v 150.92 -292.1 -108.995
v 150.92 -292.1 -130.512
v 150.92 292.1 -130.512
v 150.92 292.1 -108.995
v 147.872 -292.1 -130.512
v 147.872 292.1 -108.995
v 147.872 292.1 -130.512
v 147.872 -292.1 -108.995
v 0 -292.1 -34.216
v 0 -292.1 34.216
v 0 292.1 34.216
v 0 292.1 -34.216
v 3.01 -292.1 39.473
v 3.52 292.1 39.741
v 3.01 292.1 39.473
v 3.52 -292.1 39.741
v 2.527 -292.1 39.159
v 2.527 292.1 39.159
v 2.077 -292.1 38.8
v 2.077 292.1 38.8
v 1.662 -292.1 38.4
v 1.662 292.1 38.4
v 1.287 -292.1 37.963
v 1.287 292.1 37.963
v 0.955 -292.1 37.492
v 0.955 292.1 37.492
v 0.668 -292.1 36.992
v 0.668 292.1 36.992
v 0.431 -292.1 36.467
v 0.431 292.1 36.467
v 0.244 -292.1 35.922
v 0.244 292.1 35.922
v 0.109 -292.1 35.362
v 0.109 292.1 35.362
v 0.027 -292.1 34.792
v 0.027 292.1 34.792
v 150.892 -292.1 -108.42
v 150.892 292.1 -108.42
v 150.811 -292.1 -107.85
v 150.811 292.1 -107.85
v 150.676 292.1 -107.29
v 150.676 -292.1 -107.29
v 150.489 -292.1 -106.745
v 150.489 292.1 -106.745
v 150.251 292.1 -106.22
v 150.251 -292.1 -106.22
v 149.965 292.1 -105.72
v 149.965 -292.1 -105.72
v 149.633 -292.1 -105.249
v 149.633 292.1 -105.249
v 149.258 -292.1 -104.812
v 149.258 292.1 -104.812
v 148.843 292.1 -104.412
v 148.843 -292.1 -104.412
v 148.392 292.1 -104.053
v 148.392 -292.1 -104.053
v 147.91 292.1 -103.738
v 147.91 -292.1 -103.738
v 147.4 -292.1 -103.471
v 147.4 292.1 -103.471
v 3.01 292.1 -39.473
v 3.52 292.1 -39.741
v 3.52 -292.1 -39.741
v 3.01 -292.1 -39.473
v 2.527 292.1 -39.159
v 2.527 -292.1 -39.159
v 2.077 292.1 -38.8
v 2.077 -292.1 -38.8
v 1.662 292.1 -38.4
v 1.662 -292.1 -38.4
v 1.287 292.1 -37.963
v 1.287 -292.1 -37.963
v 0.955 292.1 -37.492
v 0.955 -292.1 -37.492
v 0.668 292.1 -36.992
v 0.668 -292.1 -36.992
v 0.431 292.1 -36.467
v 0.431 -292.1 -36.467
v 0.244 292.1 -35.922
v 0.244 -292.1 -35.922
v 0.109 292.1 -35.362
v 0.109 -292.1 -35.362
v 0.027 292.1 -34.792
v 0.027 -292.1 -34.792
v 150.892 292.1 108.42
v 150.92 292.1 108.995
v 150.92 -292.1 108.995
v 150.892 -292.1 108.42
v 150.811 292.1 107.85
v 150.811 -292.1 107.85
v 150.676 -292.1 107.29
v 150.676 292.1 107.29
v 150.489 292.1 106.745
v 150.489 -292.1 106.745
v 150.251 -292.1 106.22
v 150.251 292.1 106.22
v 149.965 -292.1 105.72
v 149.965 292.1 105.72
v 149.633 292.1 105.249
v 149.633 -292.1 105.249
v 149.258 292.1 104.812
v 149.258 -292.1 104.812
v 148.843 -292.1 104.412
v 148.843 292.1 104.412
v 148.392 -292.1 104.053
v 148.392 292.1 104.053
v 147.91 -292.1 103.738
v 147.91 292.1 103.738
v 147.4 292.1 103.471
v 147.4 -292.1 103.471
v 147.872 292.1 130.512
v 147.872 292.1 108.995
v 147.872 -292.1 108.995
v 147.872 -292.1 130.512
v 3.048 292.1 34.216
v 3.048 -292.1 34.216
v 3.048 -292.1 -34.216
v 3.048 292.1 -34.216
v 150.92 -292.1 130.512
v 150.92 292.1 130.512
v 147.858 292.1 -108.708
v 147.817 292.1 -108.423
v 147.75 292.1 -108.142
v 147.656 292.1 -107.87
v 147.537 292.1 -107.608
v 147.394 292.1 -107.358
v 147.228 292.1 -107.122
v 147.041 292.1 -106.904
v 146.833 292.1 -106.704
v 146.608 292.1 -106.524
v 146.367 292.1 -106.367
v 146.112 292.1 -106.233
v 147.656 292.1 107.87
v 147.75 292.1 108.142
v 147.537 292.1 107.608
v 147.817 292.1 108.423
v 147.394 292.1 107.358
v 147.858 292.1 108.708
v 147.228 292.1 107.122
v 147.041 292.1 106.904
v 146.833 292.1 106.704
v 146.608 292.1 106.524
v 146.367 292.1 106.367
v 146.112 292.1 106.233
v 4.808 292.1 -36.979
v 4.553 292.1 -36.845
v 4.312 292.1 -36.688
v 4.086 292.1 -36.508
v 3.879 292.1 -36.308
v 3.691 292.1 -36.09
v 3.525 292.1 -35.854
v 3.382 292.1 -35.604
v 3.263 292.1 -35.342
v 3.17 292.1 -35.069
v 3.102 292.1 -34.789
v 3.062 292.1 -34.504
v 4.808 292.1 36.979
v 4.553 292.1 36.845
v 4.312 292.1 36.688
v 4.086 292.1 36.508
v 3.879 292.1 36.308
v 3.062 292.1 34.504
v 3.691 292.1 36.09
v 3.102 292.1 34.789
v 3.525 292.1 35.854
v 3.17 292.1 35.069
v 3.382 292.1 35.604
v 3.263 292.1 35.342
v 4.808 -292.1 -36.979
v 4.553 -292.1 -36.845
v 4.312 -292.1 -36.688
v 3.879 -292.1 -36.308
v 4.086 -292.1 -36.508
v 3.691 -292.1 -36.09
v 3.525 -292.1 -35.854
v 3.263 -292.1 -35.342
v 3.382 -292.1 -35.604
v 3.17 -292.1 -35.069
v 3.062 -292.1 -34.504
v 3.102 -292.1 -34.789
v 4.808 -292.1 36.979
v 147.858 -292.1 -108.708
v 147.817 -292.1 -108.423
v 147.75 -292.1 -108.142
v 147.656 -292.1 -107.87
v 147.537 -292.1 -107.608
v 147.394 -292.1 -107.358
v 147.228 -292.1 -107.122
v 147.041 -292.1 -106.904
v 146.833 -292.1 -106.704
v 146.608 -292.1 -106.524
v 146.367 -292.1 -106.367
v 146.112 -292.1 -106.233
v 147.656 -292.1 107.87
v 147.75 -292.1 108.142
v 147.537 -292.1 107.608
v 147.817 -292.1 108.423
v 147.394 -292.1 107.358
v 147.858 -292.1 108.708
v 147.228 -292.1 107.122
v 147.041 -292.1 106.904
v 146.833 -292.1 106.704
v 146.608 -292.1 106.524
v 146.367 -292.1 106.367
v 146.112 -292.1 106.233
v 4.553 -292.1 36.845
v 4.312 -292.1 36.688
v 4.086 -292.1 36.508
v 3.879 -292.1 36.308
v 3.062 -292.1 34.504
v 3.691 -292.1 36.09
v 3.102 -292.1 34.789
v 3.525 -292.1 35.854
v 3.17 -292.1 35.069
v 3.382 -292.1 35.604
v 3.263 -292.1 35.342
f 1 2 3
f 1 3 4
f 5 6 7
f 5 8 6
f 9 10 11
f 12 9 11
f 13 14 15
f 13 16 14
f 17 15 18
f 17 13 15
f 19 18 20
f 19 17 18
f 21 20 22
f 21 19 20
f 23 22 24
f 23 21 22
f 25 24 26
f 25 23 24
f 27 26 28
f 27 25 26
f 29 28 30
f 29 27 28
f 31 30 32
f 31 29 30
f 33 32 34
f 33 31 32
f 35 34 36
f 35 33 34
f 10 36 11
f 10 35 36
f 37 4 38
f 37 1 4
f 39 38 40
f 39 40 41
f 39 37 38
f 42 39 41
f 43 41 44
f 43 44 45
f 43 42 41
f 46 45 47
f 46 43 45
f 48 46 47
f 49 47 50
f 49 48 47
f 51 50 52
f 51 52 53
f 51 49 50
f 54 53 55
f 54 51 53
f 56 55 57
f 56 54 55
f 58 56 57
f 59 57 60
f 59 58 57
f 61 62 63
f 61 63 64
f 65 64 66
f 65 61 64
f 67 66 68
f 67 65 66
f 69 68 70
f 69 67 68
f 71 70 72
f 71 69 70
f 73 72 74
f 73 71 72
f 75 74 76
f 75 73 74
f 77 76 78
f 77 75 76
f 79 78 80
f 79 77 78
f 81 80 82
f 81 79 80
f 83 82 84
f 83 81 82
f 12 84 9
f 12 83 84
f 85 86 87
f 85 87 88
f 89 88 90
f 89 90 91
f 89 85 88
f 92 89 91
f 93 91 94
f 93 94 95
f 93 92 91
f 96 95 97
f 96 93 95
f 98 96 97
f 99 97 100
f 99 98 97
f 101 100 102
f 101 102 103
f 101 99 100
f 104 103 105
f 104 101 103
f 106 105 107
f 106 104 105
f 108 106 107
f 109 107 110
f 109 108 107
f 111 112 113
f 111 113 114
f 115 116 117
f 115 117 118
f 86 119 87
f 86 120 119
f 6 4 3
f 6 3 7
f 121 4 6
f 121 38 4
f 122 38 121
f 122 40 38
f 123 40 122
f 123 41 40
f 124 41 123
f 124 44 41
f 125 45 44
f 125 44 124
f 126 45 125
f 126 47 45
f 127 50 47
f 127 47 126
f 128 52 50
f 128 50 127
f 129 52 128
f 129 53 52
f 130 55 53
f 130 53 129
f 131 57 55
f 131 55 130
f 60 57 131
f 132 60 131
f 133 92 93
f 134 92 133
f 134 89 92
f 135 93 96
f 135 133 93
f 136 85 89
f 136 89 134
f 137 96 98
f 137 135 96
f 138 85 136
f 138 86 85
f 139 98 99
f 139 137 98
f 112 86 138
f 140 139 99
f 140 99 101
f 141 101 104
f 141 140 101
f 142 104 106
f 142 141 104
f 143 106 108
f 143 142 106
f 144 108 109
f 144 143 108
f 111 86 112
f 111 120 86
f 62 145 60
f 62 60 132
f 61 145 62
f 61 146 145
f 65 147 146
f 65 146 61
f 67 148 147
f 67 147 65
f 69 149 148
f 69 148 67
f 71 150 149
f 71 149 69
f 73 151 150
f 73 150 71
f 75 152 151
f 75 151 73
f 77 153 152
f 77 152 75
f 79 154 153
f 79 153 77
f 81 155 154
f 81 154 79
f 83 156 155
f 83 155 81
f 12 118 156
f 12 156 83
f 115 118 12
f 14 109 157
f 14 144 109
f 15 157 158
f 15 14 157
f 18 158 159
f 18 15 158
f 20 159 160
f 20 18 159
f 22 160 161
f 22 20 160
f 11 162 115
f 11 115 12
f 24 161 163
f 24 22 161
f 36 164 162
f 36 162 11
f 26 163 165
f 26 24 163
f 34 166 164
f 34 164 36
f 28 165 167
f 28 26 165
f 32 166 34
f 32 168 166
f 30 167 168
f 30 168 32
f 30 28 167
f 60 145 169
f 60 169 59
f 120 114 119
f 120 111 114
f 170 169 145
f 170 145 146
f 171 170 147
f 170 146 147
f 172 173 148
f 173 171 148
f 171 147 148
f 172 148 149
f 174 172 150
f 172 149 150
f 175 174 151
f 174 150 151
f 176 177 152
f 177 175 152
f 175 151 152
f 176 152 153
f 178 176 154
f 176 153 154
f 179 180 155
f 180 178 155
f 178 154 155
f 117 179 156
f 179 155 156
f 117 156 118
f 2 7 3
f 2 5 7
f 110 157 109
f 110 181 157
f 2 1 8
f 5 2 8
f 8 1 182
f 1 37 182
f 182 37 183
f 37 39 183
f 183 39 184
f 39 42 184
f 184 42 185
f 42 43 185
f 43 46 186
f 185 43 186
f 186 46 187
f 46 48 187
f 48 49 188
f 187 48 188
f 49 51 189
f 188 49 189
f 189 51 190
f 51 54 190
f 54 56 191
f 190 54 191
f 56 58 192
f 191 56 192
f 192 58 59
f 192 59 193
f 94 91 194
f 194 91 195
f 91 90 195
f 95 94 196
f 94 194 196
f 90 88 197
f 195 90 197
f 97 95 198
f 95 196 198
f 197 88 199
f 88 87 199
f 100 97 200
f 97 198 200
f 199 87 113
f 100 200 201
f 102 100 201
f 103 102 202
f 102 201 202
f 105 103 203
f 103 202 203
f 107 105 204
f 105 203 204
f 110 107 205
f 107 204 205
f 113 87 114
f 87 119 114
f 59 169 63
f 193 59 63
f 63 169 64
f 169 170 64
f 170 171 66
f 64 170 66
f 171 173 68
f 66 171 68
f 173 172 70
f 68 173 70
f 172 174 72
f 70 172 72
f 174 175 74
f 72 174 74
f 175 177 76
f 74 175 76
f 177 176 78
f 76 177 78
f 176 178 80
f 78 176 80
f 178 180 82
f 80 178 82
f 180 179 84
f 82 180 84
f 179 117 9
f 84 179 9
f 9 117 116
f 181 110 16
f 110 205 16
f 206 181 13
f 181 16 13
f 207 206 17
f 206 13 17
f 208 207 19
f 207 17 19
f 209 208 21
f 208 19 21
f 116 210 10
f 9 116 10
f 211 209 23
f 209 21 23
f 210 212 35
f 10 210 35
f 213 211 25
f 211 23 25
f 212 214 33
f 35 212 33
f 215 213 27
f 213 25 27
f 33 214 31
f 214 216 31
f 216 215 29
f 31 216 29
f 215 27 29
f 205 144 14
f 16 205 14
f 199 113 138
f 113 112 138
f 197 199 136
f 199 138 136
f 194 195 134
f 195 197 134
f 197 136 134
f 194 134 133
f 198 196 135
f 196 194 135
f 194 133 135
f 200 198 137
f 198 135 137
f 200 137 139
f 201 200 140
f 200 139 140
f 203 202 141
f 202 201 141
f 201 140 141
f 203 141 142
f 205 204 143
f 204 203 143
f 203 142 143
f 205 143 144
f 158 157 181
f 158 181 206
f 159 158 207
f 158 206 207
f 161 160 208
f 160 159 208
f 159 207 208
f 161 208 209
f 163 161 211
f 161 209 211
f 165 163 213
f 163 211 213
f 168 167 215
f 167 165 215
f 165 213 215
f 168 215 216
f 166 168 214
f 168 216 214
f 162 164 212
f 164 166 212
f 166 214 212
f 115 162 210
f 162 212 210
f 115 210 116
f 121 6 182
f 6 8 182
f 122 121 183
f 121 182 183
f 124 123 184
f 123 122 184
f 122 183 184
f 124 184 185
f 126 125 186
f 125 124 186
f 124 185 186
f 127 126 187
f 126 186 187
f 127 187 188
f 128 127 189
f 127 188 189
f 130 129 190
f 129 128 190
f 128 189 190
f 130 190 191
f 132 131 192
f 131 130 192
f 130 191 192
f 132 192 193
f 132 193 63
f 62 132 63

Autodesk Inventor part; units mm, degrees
ref_plane "YZ Plane" through (0, 0, 0) normal (1, 0, 0) x (0, 1, 0)
ref_plane "XZ Plane" through (0, 0, 0) normal (0, 1, 0) x (-1, 0, 0)
ref_plane "XY Plane" through (0, 0, 0) normal (0, 0, 1) x (1, 0, 0)
sketch "Sketch1" plane through (0, 0, 0) normal (1, 0, 0) x (0, 1, 0)
  line L0 (292.1, 38.1) -> (-292.1, 38.1)
  line L1 (-292.1, 38.1) -> (-292.1, -38.1)
  line L2 (-292.1, -38.1) -> (292.1, -38.1)
  line L3 (292.1, -38.1) -> (292.1, 38.1)
  line L4 (-408.94, 0) -> (408.94, 0)
  line L5 (0, -53.34) -> (0, 53.34)
  point P0 (0, 0)
  dimension "d0" = 76.2
  dimension "d1" = 584.2
extrude "Plate1" add sketch "Sketch1" along normal blind 3.048
sketch "Sketch2" plane through (1.2881, 292.1, -35.3376) normal (-0.4226183, 0, -0.9063078) x (0, -1, 0)
  line L0 (584.2, 0) -> (0, 0)
  line L1 (0, 0) -> (0, -165.1)
  line L2 (0, -165.1) -> (584.2, -165.1)
  line L3 (584.2, -165.1) -> (584.2, 0)
edge flange "Flange1" height 165.1 angle 65 thickness 3.048 bend radius 3.048 thickness toward (-0.4226183, 0, -0.9063078) relief tear relief width 3.048 relief depth 1.524 corner gap 3.048 corner form 0 edges at (3.048, 0, -38.1) (3.048, 0, 38.1) wall of the first edge with corners at (1.2881, -292.1, -35.3376) (1.2881, 292.1, -35.3376) (150.9196, 292.1, -105.1118) (150.9196, -292.1, -105.1118)
bend "Bend1"
corner "Corner1"
sketch "Sketch3" plane through (147.8716, 292.1, 105.1118) normal (1, 0, 0) x (0, 1, 0)
  line L0 (-584.2, 0) -> (0, 0)
  line L1 (0, 0) -> (0, 25.4)
  line L2 (0, 25.4) -> (-584.2, 25.4)
  line L3 (-584.2, 25.4) -> (-584.2, 0)
edge flange "Flange2" height 25.4 angle 65 thickness 3.048 bend radius 3.048 thickness toward (1, 0, 0) relief tear relief width 3.048 relief depth 1.524 corner gap 3.048 corner form 0 edges at (149.6314, 0, 107.8743) (149.6314, 0, -107.8743) wall of the first edge with corners at (147.8716, -292.1, 105.1118) (147.8716, 292.1, 105.1118) (147.8716, 292.1, 130.5118) (147.8716, -292.1, 130.5118)
bend "Bend2"
corner "Corner2"
equation "\"d3\" = BendReliefWidth"
equation "\"d4\" = BendReliefDepth"
equation "\"d5\" = MinimumRemnant"
equation "\"d6\" = BendRadius"
equation "\"d9\" = BendRadius"
equation "\"d10\" = CornerReliefSize"
equation "\"d11\" = GapSize"
equation "\"d12\" = JacobiRadiusSize"
equation "\"d13\" = BendReliefWidth"
equation "\"d14\" = BendReliefDepth"
equation "\"d15\" = MinimumRemnant"
equation "\"d16\" = BendRadius"
equation "\"d19\" = BendRadius"
equation "\"d20\" = CornerReliefSize"
equation "\"d21\" = GapSize"
equation "\"d22\" = JacobiRadiusSize"
equation "\"BendRadius\" = Thickness"
equation "\"BendReliefWidth\" = Thickness"
equation "\"BendReliefDepth\" = 0.5 * Thickness"
equation "\"CornerReliefSize\" = 4 * Thickness"
equation "\"MinimumRemnant\" = 2 * Thickness"
equation "\"TransitionRadius\" = BendRadius"
equation "\"JacobiRadiusSize\" = BendRadius"
equation "\"GapSize\" = Thickness"
equation "\"d2\" = BendRadius"
equation "\"Thickness\" = 3.048"
properties part number "Bread Pan"
